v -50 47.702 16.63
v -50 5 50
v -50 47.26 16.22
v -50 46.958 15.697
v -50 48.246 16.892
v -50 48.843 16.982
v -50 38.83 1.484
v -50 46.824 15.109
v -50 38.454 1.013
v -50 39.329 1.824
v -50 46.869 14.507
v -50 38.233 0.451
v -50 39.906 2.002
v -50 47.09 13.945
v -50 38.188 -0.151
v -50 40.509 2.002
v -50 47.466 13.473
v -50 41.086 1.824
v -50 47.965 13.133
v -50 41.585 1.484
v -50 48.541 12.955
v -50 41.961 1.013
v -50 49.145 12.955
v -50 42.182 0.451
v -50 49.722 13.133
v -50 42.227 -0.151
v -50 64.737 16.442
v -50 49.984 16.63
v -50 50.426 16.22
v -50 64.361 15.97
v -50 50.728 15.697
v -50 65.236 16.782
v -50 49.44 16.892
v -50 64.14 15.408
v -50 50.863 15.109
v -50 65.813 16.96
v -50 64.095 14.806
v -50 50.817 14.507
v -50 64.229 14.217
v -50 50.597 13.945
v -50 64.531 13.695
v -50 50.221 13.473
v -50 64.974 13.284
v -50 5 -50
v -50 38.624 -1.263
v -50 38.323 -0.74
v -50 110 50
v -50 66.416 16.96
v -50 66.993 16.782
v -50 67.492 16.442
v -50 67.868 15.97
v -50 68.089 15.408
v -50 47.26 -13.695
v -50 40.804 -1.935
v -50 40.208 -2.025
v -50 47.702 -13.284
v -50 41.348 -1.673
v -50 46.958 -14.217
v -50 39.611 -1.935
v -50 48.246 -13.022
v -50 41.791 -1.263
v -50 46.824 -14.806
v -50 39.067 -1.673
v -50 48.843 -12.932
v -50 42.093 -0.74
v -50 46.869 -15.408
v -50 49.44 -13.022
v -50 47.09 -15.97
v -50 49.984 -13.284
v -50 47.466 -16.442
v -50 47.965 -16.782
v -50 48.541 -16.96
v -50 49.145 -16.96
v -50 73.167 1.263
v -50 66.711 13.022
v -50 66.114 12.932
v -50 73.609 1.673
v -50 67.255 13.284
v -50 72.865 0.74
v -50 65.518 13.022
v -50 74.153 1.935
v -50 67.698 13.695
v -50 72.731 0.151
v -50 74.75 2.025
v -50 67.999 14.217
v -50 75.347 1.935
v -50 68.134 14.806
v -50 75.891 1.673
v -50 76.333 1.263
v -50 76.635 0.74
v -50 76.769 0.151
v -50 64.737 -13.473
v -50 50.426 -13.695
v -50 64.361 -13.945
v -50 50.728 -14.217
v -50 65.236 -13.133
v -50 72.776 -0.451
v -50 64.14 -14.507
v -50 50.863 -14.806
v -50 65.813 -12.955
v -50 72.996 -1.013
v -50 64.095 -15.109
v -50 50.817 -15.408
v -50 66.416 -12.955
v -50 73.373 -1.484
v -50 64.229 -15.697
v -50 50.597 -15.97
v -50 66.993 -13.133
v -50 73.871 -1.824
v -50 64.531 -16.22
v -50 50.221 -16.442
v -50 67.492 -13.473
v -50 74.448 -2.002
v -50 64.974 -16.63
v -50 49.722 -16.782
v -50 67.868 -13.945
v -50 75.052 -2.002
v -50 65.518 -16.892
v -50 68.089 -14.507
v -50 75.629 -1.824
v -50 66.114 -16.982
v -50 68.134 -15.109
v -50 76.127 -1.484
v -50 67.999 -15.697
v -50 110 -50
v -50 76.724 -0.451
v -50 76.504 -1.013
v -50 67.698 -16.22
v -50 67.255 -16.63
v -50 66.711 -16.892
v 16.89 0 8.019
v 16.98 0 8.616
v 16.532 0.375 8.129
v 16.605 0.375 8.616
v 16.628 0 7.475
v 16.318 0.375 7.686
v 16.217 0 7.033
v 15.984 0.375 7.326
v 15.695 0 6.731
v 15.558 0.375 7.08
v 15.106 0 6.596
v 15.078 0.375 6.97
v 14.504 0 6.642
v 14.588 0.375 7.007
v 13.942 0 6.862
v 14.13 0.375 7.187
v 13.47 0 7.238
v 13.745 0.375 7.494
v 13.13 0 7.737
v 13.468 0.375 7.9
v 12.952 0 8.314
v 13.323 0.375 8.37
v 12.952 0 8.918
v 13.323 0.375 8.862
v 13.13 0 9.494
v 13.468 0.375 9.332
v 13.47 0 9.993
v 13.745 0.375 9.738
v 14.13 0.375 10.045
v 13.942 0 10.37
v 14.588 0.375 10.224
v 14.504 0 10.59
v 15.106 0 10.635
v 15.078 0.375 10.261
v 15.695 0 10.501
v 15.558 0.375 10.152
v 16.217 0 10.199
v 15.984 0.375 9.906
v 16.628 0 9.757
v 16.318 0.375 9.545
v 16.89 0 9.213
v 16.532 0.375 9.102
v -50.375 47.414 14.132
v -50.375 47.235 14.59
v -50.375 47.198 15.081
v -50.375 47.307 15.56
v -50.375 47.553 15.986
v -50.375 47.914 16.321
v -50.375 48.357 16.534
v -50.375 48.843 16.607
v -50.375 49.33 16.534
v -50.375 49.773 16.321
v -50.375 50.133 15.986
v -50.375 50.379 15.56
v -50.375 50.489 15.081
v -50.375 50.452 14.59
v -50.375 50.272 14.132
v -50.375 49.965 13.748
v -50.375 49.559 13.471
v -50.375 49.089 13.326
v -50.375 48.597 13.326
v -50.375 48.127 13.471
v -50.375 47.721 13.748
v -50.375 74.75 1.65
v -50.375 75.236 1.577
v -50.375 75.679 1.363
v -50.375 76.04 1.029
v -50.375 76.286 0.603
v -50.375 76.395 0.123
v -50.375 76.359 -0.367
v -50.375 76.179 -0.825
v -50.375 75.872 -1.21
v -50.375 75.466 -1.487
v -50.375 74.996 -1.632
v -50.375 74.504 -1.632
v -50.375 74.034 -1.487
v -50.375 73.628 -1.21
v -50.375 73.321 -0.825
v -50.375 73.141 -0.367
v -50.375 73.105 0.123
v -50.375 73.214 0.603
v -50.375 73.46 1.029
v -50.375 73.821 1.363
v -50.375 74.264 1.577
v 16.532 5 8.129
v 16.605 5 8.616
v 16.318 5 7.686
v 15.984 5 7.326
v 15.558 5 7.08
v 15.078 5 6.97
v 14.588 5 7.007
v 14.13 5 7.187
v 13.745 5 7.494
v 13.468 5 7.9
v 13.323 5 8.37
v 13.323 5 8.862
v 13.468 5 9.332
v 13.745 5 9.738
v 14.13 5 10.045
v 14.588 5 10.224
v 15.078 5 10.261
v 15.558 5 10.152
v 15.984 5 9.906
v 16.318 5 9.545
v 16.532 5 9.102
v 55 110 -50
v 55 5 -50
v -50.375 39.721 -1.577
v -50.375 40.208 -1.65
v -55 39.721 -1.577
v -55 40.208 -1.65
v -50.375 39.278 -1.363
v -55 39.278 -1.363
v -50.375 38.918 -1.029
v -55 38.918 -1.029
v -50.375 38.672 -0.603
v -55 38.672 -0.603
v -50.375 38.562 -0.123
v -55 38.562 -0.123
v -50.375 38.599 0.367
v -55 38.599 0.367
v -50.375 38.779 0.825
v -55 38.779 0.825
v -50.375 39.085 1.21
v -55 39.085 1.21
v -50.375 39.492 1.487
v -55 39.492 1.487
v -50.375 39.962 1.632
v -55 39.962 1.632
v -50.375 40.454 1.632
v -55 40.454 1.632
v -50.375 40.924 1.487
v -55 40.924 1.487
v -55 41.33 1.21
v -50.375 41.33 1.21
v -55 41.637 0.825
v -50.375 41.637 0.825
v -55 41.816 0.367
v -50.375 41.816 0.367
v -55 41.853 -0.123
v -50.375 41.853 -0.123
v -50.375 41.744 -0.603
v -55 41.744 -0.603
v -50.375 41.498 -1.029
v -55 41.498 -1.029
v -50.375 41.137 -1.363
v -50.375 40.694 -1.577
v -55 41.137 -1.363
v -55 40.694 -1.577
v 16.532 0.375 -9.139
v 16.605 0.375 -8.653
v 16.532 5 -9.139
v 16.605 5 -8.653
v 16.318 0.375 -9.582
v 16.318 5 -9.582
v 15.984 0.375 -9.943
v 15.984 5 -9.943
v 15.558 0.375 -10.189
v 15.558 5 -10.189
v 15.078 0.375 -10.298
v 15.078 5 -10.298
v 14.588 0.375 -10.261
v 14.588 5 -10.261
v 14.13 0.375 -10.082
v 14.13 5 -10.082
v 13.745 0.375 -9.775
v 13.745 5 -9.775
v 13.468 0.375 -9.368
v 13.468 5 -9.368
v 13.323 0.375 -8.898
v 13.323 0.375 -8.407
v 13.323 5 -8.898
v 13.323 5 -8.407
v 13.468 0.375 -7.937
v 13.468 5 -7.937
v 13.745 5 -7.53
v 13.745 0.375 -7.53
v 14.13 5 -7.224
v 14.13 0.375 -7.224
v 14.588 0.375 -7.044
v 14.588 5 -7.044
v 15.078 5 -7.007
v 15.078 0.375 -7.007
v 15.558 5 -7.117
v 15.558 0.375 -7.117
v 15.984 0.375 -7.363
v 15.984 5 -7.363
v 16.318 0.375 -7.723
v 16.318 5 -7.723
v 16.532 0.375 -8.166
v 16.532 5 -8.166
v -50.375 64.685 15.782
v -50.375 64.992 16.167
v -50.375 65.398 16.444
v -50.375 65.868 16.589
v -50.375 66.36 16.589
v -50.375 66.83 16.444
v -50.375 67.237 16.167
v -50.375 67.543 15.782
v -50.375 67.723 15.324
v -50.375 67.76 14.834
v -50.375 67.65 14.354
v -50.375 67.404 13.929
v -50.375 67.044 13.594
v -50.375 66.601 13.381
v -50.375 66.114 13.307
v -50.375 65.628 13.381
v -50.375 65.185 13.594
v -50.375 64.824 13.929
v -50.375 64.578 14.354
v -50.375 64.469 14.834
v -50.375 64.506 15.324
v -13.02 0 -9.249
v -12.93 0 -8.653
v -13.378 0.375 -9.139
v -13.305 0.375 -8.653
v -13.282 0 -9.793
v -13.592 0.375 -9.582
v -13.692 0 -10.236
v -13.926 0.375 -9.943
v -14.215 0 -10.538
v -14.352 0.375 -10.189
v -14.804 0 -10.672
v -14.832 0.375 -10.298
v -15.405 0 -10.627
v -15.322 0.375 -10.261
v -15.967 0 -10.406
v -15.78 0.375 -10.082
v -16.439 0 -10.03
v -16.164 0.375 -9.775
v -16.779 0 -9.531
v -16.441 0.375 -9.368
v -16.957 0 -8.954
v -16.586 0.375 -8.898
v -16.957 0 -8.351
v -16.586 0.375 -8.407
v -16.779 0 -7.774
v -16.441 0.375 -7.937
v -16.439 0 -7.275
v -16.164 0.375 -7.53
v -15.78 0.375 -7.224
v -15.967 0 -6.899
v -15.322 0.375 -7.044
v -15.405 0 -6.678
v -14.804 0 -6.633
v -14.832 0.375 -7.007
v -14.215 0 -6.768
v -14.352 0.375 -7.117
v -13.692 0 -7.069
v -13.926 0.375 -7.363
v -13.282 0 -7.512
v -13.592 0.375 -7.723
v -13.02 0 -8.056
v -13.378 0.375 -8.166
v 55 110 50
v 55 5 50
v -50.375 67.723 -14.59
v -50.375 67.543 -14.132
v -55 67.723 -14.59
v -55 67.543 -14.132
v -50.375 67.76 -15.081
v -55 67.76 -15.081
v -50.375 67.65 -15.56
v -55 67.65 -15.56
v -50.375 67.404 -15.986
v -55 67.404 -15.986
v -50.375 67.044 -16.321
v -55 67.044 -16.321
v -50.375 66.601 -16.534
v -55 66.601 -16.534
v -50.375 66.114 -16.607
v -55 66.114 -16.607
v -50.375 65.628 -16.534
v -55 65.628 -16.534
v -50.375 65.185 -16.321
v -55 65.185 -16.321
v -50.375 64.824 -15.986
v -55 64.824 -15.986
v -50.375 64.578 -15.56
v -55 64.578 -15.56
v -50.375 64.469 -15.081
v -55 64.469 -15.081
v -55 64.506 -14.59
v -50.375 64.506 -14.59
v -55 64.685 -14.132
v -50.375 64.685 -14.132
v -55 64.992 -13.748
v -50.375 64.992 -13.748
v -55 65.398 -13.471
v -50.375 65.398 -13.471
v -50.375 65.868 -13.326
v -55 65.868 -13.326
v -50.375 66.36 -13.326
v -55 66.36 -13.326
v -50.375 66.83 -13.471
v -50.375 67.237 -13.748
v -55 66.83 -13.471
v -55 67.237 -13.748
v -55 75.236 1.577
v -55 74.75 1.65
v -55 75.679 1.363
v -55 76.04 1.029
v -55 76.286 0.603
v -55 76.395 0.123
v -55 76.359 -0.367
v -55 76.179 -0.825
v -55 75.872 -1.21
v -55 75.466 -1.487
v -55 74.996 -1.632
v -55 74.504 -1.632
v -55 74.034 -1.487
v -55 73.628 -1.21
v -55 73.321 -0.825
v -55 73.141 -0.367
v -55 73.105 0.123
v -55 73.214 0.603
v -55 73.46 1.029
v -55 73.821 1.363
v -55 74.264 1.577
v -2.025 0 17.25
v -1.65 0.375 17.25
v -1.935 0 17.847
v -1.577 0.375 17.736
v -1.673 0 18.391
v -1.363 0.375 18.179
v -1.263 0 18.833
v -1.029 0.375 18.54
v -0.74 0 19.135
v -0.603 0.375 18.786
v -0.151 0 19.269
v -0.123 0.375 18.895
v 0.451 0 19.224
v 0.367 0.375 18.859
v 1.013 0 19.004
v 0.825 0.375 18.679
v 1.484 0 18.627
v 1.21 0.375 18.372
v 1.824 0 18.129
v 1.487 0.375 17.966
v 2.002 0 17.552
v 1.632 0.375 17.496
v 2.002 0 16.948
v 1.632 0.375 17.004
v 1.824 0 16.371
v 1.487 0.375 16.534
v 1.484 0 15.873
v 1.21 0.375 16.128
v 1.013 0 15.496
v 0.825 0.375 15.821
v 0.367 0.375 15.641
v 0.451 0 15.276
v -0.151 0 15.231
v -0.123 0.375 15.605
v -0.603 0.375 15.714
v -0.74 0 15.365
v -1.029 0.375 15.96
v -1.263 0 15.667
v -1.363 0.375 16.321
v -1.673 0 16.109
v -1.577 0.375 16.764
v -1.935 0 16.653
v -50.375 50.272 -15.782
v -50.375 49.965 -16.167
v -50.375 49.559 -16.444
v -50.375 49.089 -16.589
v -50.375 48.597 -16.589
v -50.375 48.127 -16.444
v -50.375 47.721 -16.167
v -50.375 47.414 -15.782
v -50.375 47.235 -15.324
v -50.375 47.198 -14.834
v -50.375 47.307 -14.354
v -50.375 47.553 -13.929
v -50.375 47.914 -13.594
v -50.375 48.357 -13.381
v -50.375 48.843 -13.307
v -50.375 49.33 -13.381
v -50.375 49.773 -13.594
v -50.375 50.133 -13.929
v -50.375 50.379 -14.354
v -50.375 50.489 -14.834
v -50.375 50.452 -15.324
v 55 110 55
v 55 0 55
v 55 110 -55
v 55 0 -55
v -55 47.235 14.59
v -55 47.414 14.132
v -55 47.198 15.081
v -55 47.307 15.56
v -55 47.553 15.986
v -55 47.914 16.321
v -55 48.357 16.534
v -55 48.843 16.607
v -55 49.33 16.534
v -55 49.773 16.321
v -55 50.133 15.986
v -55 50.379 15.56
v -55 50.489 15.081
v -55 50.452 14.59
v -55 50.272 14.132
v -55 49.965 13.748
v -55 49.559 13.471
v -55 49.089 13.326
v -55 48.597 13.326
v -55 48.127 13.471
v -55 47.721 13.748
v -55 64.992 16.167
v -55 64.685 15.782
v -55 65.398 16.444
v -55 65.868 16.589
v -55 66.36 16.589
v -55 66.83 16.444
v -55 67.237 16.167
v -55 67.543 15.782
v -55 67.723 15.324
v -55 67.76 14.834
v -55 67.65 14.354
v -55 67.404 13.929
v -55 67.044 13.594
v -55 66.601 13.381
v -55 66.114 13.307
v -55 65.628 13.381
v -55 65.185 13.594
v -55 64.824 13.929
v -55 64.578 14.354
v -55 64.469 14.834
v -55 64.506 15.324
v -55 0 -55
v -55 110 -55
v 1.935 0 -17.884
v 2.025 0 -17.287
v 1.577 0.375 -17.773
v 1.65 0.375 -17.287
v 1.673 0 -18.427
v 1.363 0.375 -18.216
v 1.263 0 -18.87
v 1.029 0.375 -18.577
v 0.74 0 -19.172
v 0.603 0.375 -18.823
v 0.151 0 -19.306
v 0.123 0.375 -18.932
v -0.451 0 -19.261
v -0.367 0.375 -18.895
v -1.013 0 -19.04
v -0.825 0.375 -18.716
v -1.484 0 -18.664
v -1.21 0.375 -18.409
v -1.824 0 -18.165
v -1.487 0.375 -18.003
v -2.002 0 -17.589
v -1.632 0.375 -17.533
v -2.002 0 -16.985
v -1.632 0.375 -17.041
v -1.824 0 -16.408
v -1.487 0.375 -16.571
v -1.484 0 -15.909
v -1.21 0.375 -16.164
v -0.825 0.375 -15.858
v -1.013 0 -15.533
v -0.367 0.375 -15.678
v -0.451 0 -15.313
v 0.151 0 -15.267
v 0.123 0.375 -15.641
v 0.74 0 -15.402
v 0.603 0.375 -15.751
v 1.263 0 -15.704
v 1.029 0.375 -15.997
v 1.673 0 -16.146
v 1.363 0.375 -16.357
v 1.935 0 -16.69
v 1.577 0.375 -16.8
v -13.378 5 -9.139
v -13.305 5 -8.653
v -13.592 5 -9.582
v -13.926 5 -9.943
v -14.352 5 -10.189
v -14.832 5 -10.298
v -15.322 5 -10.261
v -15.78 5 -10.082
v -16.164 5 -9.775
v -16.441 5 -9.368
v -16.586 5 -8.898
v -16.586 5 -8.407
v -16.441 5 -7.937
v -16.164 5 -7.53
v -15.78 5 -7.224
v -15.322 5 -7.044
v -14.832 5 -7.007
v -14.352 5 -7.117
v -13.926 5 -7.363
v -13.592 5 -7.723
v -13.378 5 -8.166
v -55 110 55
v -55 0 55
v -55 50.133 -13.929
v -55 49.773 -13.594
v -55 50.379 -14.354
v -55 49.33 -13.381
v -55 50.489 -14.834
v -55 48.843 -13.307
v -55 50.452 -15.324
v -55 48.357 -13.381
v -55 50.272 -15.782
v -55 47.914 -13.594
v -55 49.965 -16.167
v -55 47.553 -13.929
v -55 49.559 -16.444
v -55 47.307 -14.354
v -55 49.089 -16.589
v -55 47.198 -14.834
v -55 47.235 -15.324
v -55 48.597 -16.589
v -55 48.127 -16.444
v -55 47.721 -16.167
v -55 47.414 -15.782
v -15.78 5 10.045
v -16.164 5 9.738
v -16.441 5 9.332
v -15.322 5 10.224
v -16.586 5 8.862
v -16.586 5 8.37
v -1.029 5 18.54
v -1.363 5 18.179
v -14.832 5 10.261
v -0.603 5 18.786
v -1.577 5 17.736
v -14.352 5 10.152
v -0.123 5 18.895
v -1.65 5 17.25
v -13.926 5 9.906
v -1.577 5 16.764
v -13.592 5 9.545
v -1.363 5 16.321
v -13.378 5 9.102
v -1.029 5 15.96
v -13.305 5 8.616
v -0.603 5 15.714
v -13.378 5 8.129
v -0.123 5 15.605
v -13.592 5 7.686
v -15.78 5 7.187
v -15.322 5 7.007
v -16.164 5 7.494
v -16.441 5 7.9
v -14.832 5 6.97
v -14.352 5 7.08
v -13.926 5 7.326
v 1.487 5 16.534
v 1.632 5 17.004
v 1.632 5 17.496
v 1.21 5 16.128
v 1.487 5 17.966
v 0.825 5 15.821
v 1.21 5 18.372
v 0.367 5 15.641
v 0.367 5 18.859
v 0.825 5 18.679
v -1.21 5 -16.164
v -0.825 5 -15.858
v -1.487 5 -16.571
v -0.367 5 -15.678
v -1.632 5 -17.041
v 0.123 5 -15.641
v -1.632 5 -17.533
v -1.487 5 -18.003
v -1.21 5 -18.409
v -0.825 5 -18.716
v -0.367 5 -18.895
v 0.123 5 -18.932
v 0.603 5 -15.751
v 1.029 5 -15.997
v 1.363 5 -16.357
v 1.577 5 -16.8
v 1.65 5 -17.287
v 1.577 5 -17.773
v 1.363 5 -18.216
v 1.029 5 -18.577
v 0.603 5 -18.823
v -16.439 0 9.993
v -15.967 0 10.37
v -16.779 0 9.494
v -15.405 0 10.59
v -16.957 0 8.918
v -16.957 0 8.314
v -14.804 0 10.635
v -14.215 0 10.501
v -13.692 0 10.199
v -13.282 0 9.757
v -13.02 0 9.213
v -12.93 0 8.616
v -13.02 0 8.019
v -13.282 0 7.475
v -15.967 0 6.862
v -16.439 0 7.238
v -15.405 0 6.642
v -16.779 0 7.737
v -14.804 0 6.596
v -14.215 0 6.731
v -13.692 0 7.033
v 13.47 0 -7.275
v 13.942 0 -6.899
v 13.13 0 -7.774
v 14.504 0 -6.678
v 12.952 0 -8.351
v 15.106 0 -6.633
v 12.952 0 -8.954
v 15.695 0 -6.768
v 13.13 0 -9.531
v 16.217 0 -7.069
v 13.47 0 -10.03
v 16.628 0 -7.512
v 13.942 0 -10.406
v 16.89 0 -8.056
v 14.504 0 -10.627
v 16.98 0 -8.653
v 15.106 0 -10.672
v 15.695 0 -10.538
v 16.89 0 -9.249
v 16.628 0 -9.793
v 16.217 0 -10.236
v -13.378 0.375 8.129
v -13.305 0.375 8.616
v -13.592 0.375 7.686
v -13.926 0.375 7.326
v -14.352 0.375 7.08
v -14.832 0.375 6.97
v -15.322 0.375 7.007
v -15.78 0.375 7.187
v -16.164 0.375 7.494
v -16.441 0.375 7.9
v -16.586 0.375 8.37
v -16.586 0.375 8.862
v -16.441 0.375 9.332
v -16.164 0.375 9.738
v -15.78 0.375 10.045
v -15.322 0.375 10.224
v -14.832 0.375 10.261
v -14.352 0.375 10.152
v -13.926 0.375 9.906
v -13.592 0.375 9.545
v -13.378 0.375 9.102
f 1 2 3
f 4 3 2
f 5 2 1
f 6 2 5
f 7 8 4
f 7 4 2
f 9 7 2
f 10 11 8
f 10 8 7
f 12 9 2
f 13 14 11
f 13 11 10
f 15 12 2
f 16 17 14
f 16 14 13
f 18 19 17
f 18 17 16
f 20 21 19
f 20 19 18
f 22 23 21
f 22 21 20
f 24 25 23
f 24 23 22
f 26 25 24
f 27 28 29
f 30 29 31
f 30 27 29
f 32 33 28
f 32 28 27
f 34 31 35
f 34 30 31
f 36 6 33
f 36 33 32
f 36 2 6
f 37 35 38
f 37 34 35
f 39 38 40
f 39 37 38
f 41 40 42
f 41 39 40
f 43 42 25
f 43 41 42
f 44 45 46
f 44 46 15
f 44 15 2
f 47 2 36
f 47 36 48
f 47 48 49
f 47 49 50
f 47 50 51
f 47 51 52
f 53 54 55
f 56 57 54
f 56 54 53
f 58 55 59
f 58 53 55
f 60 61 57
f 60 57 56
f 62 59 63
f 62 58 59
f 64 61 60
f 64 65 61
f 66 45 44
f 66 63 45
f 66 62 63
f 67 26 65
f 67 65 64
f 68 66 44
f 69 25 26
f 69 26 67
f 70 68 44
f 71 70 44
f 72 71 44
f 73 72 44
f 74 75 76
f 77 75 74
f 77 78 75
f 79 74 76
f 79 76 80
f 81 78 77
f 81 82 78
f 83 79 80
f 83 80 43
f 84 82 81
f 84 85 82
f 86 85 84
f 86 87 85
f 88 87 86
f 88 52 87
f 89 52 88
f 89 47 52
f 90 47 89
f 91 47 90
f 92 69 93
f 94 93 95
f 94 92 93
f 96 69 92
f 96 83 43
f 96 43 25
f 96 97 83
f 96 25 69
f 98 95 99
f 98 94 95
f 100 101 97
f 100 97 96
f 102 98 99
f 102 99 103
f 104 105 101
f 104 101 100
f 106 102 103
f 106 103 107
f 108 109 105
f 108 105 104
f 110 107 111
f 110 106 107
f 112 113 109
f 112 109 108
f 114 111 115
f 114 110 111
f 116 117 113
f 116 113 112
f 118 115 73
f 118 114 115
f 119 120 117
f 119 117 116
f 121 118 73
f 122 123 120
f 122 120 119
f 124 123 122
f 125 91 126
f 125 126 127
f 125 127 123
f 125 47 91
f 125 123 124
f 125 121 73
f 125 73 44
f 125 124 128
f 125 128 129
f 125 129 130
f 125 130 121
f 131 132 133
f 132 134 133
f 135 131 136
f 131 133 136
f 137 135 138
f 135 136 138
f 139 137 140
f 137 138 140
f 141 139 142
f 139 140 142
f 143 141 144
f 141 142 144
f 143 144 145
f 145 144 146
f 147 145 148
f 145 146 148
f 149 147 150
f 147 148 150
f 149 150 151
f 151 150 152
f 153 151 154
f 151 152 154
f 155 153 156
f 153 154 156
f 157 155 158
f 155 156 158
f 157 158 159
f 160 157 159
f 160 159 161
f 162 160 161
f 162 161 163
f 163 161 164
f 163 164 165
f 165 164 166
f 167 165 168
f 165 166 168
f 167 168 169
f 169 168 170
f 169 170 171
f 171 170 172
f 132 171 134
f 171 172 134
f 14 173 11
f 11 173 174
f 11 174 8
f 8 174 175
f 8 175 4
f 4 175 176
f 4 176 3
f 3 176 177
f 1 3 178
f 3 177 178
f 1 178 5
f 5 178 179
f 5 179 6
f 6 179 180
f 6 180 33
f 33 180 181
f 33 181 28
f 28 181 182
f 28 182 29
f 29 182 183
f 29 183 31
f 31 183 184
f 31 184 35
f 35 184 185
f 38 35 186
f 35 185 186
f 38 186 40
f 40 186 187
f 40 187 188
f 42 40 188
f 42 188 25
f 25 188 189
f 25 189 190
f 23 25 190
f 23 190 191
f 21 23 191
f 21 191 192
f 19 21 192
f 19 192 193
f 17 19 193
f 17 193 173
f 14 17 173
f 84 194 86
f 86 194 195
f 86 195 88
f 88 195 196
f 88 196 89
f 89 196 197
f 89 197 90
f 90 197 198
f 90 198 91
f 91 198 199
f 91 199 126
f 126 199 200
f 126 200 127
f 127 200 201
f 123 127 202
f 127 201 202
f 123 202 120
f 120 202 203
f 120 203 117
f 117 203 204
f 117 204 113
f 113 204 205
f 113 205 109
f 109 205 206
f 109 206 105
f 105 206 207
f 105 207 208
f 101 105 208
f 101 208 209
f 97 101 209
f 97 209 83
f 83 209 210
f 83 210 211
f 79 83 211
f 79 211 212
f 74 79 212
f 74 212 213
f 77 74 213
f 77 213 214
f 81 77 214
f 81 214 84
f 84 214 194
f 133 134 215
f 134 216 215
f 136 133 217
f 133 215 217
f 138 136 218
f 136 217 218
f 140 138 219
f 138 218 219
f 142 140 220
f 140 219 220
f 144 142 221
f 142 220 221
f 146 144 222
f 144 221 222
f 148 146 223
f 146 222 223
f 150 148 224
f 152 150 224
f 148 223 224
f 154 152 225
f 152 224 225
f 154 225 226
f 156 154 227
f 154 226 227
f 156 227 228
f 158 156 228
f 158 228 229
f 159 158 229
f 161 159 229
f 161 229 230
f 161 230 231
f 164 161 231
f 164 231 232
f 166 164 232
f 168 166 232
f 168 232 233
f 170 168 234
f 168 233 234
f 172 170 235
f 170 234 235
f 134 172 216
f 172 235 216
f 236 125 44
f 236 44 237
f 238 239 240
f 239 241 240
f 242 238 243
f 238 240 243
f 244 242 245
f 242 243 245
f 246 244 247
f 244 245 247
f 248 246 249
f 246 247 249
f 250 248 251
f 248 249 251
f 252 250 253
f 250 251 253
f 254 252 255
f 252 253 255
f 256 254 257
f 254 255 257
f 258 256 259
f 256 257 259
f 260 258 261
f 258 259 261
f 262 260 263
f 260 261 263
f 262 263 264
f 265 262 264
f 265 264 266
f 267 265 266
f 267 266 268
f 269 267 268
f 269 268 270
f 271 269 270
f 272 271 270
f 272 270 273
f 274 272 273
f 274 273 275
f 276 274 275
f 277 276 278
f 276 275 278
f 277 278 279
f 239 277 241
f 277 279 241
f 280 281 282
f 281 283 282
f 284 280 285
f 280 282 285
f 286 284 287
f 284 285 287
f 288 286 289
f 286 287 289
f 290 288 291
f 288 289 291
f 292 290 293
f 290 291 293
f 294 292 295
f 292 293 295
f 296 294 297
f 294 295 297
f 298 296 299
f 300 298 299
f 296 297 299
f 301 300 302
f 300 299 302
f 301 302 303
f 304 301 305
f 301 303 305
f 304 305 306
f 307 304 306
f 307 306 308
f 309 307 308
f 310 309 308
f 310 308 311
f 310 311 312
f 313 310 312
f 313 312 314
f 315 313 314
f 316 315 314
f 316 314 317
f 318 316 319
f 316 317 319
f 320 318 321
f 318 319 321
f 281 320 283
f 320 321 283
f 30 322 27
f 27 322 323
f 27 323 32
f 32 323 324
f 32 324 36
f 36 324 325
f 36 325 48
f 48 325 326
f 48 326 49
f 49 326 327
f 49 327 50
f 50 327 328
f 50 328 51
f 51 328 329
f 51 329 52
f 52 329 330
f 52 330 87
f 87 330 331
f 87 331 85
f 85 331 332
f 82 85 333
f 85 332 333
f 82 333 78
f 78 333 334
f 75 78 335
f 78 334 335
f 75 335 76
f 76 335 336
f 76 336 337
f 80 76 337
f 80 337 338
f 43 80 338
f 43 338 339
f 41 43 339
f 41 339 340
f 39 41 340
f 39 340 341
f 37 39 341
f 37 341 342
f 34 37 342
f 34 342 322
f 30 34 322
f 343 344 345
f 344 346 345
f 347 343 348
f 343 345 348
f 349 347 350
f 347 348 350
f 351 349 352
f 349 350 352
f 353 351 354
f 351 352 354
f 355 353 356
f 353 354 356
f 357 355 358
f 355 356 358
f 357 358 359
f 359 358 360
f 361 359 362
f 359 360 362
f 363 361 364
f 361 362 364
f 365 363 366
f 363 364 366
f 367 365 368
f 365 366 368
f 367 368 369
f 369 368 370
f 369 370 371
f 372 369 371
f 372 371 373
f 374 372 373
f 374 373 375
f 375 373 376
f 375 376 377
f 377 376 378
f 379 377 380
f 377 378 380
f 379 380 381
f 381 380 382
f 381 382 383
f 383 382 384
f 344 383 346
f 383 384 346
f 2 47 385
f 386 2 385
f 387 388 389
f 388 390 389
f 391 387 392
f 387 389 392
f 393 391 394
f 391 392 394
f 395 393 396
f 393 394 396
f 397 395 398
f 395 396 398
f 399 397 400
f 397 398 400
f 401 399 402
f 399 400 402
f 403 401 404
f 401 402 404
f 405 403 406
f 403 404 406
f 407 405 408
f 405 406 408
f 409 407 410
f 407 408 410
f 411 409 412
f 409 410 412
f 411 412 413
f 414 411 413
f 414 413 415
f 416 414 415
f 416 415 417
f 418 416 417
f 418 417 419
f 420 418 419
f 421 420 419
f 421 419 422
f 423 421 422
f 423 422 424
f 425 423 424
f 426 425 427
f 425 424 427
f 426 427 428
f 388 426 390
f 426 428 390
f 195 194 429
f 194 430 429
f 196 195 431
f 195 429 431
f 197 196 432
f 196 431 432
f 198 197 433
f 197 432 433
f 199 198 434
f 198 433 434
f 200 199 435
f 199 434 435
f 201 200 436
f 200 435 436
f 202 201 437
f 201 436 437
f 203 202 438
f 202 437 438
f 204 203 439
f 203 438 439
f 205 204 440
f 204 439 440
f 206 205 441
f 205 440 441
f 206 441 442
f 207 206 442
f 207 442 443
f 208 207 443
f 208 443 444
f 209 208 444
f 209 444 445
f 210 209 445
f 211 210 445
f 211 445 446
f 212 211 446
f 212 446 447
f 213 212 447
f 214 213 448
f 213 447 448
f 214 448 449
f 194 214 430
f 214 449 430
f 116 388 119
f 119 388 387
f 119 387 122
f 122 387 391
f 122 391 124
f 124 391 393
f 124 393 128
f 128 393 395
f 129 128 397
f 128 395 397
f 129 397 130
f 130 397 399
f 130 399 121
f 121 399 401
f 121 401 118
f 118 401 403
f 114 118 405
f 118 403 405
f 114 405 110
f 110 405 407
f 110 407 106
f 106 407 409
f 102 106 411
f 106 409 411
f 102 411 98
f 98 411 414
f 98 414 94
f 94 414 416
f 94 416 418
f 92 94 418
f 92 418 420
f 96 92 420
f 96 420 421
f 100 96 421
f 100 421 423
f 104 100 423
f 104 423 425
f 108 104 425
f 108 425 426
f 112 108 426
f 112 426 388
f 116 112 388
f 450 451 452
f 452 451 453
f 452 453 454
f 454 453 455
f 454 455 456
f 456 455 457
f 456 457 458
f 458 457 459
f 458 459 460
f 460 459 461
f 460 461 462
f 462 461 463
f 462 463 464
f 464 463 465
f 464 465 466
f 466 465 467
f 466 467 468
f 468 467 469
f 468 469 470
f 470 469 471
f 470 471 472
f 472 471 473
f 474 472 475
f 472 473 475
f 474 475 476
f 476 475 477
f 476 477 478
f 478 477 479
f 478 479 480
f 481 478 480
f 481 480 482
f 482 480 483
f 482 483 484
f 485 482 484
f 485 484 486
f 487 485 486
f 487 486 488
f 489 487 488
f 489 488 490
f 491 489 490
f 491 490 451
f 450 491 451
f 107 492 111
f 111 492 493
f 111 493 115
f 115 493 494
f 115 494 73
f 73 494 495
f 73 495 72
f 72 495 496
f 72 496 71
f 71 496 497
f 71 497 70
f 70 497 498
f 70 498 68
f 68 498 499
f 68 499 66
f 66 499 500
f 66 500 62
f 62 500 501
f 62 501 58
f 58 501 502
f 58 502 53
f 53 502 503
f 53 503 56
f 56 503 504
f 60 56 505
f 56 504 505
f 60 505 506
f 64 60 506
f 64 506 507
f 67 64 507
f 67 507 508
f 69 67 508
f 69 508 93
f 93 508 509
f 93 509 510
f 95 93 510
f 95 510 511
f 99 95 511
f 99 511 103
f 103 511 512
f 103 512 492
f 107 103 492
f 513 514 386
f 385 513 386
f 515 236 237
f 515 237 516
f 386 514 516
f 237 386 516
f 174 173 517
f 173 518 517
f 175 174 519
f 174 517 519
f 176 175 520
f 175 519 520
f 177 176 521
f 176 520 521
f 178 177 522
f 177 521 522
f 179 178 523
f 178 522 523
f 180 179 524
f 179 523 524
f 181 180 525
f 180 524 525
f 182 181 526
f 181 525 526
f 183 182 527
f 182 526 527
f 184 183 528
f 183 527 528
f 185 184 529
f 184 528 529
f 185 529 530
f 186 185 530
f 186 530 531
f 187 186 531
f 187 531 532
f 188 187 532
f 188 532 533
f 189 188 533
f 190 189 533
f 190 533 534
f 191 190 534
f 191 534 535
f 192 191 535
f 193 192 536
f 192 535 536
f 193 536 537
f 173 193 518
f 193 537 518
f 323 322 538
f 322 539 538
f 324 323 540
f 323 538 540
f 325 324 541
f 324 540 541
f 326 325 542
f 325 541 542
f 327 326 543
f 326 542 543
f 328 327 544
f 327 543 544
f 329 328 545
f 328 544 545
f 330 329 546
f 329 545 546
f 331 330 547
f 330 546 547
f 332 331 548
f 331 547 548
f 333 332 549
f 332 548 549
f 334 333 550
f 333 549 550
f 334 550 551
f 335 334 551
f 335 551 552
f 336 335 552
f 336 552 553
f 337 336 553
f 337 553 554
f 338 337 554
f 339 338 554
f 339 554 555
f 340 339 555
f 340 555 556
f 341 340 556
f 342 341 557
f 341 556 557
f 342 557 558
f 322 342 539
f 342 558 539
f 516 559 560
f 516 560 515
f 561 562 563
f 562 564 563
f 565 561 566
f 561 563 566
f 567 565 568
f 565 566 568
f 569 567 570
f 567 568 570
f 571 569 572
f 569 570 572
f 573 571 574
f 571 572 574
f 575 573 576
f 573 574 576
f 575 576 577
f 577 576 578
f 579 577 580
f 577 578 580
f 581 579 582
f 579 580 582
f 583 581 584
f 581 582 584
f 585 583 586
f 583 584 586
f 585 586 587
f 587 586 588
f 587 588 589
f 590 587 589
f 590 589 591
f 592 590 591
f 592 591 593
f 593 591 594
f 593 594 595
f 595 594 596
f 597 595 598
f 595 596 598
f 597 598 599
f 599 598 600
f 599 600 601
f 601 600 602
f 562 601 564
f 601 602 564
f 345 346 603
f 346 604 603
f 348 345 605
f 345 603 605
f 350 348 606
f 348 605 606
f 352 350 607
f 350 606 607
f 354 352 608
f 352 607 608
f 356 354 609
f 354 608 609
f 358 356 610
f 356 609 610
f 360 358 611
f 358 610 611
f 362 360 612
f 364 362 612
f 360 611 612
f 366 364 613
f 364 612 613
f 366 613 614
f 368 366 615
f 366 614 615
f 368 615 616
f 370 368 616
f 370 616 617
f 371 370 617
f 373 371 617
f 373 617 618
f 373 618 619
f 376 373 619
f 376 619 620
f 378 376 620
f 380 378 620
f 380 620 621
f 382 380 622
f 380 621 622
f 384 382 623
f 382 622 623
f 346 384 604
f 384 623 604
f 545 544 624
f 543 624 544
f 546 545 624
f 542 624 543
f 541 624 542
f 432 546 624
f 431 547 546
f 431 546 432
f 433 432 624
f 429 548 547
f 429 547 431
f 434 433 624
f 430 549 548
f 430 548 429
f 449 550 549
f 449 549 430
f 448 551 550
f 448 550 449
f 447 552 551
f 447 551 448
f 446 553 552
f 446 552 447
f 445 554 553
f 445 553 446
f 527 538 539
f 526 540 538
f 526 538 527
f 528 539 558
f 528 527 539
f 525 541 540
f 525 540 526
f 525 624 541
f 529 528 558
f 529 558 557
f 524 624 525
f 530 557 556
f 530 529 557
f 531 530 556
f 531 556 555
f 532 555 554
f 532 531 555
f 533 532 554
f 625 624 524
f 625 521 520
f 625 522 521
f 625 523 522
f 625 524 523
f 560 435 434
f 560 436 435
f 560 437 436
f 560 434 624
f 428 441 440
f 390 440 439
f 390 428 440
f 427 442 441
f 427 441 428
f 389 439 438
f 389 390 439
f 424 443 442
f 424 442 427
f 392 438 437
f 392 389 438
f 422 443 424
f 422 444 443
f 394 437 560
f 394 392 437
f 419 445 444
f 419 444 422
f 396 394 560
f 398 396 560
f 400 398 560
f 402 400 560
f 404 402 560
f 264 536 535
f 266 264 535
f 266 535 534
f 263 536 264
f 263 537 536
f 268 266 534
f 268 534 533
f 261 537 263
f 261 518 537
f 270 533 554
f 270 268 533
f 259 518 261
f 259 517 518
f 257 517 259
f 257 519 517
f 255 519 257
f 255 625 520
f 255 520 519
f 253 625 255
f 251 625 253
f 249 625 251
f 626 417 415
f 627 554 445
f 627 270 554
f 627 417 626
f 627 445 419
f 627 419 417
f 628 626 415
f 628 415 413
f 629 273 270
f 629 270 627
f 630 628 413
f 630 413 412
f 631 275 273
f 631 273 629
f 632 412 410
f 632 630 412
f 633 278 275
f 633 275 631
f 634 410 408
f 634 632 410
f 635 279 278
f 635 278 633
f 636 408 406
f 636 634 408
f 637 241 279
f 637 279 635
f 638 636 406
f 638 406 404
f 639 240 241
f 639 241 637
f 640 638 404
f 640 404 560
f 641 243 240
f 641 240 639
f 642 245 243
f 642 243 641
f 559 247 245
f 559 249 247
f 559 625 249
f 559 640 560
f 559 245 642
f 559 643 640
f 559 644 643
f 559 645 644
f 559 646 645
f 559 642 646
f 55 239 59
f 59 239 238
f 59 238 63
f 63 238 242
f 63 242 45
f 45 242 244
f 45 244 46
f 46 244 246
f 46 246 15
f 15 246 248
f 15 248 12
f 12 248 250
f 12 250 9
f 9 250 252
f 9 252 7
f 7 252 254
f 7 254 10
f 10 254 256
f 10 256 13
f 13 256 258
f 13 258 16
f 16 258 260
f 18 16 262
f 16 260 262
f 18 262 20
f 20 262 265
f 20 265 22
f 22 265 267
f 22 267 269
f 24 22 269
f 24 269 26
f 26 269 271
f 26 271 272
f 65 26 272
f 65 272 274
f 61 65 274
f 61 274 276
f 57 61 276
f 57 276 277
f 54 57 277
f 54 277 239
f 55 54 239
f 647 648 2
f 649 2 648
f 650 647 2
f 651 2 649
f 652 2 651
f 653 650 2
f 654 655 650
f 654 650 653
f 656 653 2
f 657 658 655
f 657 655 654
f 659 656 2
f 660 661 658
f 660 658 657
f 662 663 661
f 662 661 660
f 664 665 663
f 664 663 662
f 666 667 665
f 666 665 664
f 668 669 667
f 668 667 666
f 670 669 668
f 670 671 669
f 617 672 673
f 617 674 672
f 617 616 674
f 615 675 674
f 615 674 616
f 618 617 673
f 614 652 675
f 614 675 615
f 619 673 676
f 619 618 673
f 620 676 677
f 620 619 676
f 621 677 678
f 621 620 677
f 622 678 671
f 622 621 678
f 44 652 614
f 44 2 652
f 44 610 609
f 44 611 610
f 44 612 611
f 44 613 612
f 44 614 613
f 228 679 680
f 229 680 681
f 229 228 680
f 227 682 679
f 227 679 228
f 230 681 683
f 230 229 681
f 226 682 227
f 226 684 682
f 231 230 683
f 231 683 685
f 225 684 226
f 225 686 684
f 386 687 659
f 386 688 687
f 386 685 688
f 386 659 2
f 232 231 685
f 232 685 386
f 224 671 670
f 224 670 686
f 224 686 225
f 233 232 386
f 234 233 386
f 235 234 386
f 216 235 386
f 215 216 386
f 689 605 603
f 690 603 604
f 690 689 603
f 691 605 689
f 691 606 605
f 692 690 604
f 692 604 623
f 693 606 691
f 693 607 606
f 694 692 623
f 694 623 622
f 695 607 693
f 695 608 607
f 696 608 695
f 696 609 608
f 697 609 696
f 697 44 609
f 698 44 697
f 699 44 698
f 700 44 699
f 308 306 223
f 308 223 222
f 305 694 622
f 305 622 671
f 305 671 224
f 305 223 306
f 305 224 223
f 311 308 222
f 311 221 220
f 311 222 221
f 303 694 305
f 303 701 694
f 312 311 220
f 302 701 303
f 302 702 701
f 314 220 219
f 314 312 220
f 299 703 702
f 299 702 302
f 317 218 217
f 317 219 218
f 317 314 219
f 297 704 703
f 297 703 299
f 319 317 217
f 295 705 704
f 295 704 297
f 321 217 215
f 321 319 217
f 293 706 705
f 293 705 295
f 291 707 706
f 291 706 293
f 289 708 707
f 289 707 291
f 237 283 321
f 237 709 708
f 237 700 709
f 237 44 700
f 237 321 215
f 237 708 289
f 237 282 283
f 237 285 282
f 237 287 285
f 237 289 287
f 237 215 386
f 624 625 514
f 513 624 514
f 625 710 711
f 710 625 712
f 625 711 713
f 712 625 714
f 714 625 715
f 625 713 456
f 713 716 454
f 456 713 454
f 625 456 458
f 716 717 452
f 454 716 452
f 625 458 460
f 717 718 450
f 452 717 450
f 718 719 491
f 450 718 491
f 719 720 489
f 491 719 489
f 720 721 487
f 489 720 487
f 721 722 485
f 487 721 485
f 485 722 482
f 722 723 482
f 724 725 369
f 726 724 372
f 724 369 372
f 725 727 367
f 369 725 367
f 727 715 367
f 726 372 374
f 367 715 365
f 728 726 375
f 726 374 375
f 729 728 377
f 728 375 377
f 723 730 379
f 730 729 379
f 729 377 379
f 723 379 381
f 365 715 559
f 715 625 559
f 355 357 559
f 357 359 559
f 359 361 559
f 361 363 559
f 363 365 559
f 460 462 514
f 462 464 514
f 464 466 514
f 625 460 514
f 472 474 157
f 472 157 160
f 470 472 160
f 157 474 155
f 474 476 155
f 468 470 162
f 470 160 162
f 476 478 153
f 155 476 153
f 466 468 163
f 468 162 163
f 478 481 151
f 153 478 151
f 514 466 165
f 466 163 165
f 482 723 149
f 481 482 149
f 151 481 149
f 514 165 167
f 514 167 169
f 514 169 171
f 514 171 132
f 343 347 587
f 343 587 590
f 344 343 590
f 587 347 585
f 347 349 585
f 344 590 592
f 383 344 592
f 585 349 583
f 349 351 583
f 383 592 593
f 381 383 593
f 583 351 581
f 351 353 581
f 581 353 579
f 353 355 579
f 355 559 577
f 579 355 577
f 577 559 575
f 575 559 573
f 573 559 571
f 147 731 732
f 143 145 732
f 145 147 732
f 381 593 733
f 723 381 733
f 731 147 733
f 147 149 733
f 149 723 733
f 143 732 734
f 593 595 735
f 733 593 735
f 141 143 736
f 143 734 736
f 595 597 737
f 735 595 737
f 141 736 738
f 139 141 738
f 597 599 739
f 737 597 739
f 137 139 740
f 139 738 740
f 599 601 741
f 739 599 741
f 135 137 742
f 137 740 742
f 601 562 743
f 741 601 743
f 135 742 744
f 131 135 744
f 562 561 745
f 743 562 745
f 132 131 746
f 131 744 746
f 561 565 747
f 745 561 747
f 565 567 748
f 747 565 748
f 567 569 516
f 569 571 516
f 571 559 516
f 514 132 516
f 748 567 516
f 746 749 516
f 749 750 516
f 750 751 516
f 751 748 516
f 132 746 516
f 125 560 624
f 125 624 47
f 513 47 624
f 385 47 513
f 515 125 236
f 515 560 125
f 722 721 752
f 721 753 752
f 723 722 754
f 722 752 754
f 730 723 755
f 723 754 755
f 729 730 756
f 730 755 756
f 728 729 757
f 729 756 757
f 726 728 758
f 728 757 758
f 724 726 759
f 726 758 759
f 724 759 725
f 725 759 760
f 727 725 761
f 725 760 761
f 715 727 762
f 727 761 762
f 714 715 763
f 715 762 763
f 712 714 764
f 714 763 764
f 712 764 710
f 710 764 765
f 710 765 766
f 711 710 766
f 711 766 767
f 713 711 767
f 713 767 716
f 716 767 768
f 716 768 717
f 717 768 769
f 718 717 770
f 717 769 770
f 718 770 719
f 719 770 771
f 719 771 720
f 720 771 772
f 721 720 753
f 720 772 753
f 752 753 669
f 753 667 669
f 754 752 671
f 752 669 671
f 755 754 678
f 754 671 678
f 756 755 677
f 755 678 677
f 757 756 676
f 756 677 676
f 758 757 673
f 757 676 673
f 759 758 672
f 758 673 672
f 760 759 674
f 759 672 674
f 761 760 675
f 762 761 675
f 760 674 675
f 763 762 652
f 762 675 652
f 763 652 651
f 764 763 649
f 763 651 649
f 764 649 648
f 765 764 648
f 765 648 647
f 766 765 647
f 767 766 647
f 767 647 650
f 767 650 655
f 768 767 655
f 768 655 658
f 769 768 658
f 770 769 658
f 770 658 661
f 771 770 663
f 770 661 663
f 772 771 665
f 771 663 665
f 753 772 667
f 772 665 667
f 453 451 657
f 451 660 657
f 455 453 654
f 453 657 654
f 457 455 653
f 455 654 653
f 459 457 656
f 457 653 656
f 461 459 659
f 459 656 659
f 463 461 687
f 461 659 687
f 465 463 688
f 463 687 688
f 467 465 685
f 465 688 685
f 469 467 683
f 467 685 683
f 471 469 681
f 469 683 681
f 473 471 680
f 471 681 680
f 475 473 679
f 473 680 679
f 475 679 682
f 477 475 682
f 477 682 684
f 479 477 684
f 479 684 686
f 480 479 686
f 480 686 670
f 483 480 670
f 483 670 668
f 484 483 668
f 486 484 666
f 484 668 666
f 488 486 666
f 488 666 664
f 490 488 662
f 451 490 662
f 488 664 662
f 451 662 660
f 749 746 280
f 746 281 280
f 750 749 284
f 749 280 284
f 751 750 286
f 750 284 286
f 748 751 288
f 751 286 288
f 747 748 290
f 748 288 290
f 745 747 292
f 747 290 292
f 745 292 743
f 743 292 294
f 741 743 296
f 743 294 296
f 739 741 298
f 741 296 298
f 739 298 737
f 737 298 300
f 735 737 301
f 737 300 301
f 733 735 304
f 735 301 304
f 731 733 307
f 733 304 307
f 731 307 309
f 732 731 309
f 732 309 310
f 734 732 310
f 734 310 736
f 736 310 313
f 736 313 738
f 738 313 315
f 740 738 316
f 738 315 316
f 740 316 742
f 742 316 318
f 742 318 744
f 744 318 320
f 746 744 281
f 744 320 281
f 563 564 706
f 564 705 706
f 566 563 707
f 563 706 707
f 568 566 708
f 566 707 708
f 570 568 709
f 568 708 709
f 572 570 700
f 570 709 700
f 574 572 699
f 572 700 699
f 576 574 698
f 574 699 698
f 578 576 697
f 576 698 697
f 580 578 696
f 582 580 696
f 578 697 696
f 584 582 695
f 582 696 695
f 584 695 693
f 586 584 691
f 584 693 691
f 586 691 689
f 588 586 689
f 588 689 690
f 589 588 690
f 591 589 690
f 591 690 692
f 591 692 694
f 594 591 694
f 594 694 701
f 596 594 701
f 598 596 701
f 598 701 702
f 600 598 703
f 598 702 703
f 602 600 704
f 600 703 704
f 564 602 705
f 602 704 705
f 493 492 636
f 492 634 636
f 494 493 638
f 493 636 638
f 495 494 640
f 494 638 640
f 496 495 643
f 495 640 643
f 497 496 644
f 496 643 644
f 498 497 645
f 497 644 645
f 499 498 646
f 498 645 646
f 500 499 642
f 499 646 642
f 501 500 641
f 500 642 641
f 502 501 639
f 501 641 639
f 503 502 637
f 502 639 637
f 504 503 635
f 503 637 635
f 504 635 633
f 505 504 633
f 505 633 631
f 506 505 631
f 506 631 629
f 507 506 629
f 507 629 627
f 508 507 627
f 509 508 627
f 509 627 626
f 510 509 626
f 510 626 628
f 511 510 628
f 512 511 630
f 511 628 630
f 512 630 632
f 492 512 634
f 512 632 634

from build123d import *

# Parameters (mm, degrees)
SKETCH_1_W                   = 110
SKETCH_1_H                   = 110
EXTRUDE_1_DEPTH              = 110
SKETCH_2_W                   = 100
SKETCH_2_H                   = 100
CUT_EXTRUDE_1_DEPTH          = 105
SKETCH_3_W                   = 13.484754144
SKETCH_3_H                   = 100
CUT_EXTRUDE_2_DEPTH          = 105
HOLE_WIZARD_M4_6_D           = 3.3
HOLE_WIZARD_M4_6_CSINK_D     = 4.05
HOLE_WIZARD_M4_6_CSINK_ANGLE = 90
HOLE_WIZARD_M4_7_D           = 3.3
HOLE_WIZARD_M4_7_CSINK_D     = 4.05
HOLE_WIZARD_M4_7_CSINK_ANGLE = 90
PATTERN_CIRCULAR_2_COUNT     = 6


# Read off the part's stored shape, not the designer's step: 阵列(圆周)1
with BuildPart() as part:
    # 草图1 → 凸台-拉伸1 (new body)
    with BuildSketch(Plane(origin=(0, 0, 0), x_dir=(1, 0, 0), z_dir=(0, 1, 0))):
        Rectangle(SKETCH_1_W, SKETCH_1_H)
    extrude(amount=EXTRUDE_1_DEPTH)

    # 草图2 → 切除-拉伸1 (cut)
    with BuildSketch(Plane(origin=(0, 110, 0), x_dir=(1, 0, 0), z_dir=(0, 1, 0))):
        Rectangle(SKETCH_2_W, SKETCH_2_H)
    extrude(amount=-CUT_EXTRUDE_1_DEPTH, mode=Mode.SUBTRACT)

    # 草图3 → 切除-拉伸2 (cut)
    with BuildSketch(Plane(origin=(0, 110, 0), x_dir=(1, 0, 0), z_dir=(0, 1, 0))):
        with Locations((56.742377072, 0)):
            Rectangle(SKETCH_3_W, SKETCH_3_H)
    extrude(amount=-CUT_EXTRUDE_2_DEPTH, mode=Mode.SUBTRACT)

    # M4 螺纹孔6 (through all)
    with Locations(Plane.XZ):
        with Locations((0, 17.25)):
            CounterSinkHole(HOLE_WIZARD_M4_6_D / 2, HOLE_WIZARD_M4_6_CSINK_D / 2, counter_sink_angle=HOLE_WIZARD_M4_6_CSINK_ANGLE)

    # 阵列(圆周)1 outline → 阵列(圆周)1 (revolve, cut)
    with BuildSketch(Plane(origin=(-14.954860189, 0, 8.615807444), x_dir=(1, 0, 0), z_dir=(0, 0, 1))):
        Polygon((1.65, 0.375), (1.65, 5), (0, 5), (0, 0), (2.025, 0), align=None)
    revolve(axis=Axis((-14.954860189, 0, 8.615807444), (0, 1, 0)), mode=Mode.SUBTRACT)

    # Pattern Circular 1 2 outline → Pattern Circular 1 2 (revolve, cut)
    with BuildSketch(Plane(origin=(-14.954860189, 0, -8.652577668), x_dir=(1, 0, 0), z_dir=(0, 0, 1))):
        Polygon((1.65, 0.375), (1.65, 5), (0, 5), (0, 0), (2.025, 0), align=None)
    revolve(axis=Axis((-14.954860189, 0, -8.652577668), (0, 1, 0)), mode=Mode.SUBTRACT)

    # Pattern Circular 1 3 outline → Pattern Circular 1 3 (revolve, cut)
    with BuildSketch(Plane.XY.offset(-17.286770224)):
        Polygon((1.65, 0.375), (1.65, 5), (0, 5), (0, 0), (2.025, 0), align=None)
    revolve(axis=Axis((0, 0, -17.286770224), (0, 1, 0)), mode=Mode.SUBTRACT)

    # Pattern Circular 1 4 outline → Pattern Circular 1 4 (revolve, cut)
    with BuildSketch(Plane(origin=(14.954860189, 0, -8.652577668), x_dir=(1, 0, 0), z_dir=(0, 0, 1))):
        Polygon((1.65, 0.375), (1.65, 5), (0, 5), (0, 0), (2.025, 0), align=None)
    revolve(axis=Axis((14.954860189, 0, -8.652577668), (0, 1, 0)), mode=Mode.SUBTRACT)

    # Pattern Circular 1 5 outline → Pattern Circular 1 5 (revolve, cut)
    with BuildSketch(Plane(origin=(14.954860189, 0, 8.615807444), x_dir=(1, 0, 0), z_dir=(0, 0, 1))):
        Polygon((1.65, 0.375), (1.65, 5), (0, 5), (0, 0), (2.025, 0), align=None)
    revolve(axis=Axis((14.954860189, 0, 8.615807444), (0, 1, 0)), mode=Mode.SUBTRACT)

    # M4 螺纹孔7 (through all)
    with Locations(Plane(origin=(-50, 0, 0), x_dir=(0, 0, -1), z_dir=(1, 0, 0))):
        with Locations((0, 74.75)):
            hole_wizard_m4_7 = CounterSinkHole(HOLE_WIZARD_M4_7_D / 2, HOLE_WIZARD_M4_7_CSINK_D / 2, counter_sink_angle=HOLE_WIZARD_M4_7_CSINK_ANGLE)

    # 阵列(圆周)2: M4 螺纹孔7 ×6 about axis
    pattern_circular_2_axis = Axis((0, 57.478809906, 0), (1, 0, 0))
    for i in range(1, PATTERN_CIRCULAR_2_COUNT):
        add(hole_wizard_m4_7.rotate(pattern_circular_2_axis, i * 360 / PATTERN_CIRCULAR_2_COUNT), mode=Mode.SUBTRACT)


solid = part.part
